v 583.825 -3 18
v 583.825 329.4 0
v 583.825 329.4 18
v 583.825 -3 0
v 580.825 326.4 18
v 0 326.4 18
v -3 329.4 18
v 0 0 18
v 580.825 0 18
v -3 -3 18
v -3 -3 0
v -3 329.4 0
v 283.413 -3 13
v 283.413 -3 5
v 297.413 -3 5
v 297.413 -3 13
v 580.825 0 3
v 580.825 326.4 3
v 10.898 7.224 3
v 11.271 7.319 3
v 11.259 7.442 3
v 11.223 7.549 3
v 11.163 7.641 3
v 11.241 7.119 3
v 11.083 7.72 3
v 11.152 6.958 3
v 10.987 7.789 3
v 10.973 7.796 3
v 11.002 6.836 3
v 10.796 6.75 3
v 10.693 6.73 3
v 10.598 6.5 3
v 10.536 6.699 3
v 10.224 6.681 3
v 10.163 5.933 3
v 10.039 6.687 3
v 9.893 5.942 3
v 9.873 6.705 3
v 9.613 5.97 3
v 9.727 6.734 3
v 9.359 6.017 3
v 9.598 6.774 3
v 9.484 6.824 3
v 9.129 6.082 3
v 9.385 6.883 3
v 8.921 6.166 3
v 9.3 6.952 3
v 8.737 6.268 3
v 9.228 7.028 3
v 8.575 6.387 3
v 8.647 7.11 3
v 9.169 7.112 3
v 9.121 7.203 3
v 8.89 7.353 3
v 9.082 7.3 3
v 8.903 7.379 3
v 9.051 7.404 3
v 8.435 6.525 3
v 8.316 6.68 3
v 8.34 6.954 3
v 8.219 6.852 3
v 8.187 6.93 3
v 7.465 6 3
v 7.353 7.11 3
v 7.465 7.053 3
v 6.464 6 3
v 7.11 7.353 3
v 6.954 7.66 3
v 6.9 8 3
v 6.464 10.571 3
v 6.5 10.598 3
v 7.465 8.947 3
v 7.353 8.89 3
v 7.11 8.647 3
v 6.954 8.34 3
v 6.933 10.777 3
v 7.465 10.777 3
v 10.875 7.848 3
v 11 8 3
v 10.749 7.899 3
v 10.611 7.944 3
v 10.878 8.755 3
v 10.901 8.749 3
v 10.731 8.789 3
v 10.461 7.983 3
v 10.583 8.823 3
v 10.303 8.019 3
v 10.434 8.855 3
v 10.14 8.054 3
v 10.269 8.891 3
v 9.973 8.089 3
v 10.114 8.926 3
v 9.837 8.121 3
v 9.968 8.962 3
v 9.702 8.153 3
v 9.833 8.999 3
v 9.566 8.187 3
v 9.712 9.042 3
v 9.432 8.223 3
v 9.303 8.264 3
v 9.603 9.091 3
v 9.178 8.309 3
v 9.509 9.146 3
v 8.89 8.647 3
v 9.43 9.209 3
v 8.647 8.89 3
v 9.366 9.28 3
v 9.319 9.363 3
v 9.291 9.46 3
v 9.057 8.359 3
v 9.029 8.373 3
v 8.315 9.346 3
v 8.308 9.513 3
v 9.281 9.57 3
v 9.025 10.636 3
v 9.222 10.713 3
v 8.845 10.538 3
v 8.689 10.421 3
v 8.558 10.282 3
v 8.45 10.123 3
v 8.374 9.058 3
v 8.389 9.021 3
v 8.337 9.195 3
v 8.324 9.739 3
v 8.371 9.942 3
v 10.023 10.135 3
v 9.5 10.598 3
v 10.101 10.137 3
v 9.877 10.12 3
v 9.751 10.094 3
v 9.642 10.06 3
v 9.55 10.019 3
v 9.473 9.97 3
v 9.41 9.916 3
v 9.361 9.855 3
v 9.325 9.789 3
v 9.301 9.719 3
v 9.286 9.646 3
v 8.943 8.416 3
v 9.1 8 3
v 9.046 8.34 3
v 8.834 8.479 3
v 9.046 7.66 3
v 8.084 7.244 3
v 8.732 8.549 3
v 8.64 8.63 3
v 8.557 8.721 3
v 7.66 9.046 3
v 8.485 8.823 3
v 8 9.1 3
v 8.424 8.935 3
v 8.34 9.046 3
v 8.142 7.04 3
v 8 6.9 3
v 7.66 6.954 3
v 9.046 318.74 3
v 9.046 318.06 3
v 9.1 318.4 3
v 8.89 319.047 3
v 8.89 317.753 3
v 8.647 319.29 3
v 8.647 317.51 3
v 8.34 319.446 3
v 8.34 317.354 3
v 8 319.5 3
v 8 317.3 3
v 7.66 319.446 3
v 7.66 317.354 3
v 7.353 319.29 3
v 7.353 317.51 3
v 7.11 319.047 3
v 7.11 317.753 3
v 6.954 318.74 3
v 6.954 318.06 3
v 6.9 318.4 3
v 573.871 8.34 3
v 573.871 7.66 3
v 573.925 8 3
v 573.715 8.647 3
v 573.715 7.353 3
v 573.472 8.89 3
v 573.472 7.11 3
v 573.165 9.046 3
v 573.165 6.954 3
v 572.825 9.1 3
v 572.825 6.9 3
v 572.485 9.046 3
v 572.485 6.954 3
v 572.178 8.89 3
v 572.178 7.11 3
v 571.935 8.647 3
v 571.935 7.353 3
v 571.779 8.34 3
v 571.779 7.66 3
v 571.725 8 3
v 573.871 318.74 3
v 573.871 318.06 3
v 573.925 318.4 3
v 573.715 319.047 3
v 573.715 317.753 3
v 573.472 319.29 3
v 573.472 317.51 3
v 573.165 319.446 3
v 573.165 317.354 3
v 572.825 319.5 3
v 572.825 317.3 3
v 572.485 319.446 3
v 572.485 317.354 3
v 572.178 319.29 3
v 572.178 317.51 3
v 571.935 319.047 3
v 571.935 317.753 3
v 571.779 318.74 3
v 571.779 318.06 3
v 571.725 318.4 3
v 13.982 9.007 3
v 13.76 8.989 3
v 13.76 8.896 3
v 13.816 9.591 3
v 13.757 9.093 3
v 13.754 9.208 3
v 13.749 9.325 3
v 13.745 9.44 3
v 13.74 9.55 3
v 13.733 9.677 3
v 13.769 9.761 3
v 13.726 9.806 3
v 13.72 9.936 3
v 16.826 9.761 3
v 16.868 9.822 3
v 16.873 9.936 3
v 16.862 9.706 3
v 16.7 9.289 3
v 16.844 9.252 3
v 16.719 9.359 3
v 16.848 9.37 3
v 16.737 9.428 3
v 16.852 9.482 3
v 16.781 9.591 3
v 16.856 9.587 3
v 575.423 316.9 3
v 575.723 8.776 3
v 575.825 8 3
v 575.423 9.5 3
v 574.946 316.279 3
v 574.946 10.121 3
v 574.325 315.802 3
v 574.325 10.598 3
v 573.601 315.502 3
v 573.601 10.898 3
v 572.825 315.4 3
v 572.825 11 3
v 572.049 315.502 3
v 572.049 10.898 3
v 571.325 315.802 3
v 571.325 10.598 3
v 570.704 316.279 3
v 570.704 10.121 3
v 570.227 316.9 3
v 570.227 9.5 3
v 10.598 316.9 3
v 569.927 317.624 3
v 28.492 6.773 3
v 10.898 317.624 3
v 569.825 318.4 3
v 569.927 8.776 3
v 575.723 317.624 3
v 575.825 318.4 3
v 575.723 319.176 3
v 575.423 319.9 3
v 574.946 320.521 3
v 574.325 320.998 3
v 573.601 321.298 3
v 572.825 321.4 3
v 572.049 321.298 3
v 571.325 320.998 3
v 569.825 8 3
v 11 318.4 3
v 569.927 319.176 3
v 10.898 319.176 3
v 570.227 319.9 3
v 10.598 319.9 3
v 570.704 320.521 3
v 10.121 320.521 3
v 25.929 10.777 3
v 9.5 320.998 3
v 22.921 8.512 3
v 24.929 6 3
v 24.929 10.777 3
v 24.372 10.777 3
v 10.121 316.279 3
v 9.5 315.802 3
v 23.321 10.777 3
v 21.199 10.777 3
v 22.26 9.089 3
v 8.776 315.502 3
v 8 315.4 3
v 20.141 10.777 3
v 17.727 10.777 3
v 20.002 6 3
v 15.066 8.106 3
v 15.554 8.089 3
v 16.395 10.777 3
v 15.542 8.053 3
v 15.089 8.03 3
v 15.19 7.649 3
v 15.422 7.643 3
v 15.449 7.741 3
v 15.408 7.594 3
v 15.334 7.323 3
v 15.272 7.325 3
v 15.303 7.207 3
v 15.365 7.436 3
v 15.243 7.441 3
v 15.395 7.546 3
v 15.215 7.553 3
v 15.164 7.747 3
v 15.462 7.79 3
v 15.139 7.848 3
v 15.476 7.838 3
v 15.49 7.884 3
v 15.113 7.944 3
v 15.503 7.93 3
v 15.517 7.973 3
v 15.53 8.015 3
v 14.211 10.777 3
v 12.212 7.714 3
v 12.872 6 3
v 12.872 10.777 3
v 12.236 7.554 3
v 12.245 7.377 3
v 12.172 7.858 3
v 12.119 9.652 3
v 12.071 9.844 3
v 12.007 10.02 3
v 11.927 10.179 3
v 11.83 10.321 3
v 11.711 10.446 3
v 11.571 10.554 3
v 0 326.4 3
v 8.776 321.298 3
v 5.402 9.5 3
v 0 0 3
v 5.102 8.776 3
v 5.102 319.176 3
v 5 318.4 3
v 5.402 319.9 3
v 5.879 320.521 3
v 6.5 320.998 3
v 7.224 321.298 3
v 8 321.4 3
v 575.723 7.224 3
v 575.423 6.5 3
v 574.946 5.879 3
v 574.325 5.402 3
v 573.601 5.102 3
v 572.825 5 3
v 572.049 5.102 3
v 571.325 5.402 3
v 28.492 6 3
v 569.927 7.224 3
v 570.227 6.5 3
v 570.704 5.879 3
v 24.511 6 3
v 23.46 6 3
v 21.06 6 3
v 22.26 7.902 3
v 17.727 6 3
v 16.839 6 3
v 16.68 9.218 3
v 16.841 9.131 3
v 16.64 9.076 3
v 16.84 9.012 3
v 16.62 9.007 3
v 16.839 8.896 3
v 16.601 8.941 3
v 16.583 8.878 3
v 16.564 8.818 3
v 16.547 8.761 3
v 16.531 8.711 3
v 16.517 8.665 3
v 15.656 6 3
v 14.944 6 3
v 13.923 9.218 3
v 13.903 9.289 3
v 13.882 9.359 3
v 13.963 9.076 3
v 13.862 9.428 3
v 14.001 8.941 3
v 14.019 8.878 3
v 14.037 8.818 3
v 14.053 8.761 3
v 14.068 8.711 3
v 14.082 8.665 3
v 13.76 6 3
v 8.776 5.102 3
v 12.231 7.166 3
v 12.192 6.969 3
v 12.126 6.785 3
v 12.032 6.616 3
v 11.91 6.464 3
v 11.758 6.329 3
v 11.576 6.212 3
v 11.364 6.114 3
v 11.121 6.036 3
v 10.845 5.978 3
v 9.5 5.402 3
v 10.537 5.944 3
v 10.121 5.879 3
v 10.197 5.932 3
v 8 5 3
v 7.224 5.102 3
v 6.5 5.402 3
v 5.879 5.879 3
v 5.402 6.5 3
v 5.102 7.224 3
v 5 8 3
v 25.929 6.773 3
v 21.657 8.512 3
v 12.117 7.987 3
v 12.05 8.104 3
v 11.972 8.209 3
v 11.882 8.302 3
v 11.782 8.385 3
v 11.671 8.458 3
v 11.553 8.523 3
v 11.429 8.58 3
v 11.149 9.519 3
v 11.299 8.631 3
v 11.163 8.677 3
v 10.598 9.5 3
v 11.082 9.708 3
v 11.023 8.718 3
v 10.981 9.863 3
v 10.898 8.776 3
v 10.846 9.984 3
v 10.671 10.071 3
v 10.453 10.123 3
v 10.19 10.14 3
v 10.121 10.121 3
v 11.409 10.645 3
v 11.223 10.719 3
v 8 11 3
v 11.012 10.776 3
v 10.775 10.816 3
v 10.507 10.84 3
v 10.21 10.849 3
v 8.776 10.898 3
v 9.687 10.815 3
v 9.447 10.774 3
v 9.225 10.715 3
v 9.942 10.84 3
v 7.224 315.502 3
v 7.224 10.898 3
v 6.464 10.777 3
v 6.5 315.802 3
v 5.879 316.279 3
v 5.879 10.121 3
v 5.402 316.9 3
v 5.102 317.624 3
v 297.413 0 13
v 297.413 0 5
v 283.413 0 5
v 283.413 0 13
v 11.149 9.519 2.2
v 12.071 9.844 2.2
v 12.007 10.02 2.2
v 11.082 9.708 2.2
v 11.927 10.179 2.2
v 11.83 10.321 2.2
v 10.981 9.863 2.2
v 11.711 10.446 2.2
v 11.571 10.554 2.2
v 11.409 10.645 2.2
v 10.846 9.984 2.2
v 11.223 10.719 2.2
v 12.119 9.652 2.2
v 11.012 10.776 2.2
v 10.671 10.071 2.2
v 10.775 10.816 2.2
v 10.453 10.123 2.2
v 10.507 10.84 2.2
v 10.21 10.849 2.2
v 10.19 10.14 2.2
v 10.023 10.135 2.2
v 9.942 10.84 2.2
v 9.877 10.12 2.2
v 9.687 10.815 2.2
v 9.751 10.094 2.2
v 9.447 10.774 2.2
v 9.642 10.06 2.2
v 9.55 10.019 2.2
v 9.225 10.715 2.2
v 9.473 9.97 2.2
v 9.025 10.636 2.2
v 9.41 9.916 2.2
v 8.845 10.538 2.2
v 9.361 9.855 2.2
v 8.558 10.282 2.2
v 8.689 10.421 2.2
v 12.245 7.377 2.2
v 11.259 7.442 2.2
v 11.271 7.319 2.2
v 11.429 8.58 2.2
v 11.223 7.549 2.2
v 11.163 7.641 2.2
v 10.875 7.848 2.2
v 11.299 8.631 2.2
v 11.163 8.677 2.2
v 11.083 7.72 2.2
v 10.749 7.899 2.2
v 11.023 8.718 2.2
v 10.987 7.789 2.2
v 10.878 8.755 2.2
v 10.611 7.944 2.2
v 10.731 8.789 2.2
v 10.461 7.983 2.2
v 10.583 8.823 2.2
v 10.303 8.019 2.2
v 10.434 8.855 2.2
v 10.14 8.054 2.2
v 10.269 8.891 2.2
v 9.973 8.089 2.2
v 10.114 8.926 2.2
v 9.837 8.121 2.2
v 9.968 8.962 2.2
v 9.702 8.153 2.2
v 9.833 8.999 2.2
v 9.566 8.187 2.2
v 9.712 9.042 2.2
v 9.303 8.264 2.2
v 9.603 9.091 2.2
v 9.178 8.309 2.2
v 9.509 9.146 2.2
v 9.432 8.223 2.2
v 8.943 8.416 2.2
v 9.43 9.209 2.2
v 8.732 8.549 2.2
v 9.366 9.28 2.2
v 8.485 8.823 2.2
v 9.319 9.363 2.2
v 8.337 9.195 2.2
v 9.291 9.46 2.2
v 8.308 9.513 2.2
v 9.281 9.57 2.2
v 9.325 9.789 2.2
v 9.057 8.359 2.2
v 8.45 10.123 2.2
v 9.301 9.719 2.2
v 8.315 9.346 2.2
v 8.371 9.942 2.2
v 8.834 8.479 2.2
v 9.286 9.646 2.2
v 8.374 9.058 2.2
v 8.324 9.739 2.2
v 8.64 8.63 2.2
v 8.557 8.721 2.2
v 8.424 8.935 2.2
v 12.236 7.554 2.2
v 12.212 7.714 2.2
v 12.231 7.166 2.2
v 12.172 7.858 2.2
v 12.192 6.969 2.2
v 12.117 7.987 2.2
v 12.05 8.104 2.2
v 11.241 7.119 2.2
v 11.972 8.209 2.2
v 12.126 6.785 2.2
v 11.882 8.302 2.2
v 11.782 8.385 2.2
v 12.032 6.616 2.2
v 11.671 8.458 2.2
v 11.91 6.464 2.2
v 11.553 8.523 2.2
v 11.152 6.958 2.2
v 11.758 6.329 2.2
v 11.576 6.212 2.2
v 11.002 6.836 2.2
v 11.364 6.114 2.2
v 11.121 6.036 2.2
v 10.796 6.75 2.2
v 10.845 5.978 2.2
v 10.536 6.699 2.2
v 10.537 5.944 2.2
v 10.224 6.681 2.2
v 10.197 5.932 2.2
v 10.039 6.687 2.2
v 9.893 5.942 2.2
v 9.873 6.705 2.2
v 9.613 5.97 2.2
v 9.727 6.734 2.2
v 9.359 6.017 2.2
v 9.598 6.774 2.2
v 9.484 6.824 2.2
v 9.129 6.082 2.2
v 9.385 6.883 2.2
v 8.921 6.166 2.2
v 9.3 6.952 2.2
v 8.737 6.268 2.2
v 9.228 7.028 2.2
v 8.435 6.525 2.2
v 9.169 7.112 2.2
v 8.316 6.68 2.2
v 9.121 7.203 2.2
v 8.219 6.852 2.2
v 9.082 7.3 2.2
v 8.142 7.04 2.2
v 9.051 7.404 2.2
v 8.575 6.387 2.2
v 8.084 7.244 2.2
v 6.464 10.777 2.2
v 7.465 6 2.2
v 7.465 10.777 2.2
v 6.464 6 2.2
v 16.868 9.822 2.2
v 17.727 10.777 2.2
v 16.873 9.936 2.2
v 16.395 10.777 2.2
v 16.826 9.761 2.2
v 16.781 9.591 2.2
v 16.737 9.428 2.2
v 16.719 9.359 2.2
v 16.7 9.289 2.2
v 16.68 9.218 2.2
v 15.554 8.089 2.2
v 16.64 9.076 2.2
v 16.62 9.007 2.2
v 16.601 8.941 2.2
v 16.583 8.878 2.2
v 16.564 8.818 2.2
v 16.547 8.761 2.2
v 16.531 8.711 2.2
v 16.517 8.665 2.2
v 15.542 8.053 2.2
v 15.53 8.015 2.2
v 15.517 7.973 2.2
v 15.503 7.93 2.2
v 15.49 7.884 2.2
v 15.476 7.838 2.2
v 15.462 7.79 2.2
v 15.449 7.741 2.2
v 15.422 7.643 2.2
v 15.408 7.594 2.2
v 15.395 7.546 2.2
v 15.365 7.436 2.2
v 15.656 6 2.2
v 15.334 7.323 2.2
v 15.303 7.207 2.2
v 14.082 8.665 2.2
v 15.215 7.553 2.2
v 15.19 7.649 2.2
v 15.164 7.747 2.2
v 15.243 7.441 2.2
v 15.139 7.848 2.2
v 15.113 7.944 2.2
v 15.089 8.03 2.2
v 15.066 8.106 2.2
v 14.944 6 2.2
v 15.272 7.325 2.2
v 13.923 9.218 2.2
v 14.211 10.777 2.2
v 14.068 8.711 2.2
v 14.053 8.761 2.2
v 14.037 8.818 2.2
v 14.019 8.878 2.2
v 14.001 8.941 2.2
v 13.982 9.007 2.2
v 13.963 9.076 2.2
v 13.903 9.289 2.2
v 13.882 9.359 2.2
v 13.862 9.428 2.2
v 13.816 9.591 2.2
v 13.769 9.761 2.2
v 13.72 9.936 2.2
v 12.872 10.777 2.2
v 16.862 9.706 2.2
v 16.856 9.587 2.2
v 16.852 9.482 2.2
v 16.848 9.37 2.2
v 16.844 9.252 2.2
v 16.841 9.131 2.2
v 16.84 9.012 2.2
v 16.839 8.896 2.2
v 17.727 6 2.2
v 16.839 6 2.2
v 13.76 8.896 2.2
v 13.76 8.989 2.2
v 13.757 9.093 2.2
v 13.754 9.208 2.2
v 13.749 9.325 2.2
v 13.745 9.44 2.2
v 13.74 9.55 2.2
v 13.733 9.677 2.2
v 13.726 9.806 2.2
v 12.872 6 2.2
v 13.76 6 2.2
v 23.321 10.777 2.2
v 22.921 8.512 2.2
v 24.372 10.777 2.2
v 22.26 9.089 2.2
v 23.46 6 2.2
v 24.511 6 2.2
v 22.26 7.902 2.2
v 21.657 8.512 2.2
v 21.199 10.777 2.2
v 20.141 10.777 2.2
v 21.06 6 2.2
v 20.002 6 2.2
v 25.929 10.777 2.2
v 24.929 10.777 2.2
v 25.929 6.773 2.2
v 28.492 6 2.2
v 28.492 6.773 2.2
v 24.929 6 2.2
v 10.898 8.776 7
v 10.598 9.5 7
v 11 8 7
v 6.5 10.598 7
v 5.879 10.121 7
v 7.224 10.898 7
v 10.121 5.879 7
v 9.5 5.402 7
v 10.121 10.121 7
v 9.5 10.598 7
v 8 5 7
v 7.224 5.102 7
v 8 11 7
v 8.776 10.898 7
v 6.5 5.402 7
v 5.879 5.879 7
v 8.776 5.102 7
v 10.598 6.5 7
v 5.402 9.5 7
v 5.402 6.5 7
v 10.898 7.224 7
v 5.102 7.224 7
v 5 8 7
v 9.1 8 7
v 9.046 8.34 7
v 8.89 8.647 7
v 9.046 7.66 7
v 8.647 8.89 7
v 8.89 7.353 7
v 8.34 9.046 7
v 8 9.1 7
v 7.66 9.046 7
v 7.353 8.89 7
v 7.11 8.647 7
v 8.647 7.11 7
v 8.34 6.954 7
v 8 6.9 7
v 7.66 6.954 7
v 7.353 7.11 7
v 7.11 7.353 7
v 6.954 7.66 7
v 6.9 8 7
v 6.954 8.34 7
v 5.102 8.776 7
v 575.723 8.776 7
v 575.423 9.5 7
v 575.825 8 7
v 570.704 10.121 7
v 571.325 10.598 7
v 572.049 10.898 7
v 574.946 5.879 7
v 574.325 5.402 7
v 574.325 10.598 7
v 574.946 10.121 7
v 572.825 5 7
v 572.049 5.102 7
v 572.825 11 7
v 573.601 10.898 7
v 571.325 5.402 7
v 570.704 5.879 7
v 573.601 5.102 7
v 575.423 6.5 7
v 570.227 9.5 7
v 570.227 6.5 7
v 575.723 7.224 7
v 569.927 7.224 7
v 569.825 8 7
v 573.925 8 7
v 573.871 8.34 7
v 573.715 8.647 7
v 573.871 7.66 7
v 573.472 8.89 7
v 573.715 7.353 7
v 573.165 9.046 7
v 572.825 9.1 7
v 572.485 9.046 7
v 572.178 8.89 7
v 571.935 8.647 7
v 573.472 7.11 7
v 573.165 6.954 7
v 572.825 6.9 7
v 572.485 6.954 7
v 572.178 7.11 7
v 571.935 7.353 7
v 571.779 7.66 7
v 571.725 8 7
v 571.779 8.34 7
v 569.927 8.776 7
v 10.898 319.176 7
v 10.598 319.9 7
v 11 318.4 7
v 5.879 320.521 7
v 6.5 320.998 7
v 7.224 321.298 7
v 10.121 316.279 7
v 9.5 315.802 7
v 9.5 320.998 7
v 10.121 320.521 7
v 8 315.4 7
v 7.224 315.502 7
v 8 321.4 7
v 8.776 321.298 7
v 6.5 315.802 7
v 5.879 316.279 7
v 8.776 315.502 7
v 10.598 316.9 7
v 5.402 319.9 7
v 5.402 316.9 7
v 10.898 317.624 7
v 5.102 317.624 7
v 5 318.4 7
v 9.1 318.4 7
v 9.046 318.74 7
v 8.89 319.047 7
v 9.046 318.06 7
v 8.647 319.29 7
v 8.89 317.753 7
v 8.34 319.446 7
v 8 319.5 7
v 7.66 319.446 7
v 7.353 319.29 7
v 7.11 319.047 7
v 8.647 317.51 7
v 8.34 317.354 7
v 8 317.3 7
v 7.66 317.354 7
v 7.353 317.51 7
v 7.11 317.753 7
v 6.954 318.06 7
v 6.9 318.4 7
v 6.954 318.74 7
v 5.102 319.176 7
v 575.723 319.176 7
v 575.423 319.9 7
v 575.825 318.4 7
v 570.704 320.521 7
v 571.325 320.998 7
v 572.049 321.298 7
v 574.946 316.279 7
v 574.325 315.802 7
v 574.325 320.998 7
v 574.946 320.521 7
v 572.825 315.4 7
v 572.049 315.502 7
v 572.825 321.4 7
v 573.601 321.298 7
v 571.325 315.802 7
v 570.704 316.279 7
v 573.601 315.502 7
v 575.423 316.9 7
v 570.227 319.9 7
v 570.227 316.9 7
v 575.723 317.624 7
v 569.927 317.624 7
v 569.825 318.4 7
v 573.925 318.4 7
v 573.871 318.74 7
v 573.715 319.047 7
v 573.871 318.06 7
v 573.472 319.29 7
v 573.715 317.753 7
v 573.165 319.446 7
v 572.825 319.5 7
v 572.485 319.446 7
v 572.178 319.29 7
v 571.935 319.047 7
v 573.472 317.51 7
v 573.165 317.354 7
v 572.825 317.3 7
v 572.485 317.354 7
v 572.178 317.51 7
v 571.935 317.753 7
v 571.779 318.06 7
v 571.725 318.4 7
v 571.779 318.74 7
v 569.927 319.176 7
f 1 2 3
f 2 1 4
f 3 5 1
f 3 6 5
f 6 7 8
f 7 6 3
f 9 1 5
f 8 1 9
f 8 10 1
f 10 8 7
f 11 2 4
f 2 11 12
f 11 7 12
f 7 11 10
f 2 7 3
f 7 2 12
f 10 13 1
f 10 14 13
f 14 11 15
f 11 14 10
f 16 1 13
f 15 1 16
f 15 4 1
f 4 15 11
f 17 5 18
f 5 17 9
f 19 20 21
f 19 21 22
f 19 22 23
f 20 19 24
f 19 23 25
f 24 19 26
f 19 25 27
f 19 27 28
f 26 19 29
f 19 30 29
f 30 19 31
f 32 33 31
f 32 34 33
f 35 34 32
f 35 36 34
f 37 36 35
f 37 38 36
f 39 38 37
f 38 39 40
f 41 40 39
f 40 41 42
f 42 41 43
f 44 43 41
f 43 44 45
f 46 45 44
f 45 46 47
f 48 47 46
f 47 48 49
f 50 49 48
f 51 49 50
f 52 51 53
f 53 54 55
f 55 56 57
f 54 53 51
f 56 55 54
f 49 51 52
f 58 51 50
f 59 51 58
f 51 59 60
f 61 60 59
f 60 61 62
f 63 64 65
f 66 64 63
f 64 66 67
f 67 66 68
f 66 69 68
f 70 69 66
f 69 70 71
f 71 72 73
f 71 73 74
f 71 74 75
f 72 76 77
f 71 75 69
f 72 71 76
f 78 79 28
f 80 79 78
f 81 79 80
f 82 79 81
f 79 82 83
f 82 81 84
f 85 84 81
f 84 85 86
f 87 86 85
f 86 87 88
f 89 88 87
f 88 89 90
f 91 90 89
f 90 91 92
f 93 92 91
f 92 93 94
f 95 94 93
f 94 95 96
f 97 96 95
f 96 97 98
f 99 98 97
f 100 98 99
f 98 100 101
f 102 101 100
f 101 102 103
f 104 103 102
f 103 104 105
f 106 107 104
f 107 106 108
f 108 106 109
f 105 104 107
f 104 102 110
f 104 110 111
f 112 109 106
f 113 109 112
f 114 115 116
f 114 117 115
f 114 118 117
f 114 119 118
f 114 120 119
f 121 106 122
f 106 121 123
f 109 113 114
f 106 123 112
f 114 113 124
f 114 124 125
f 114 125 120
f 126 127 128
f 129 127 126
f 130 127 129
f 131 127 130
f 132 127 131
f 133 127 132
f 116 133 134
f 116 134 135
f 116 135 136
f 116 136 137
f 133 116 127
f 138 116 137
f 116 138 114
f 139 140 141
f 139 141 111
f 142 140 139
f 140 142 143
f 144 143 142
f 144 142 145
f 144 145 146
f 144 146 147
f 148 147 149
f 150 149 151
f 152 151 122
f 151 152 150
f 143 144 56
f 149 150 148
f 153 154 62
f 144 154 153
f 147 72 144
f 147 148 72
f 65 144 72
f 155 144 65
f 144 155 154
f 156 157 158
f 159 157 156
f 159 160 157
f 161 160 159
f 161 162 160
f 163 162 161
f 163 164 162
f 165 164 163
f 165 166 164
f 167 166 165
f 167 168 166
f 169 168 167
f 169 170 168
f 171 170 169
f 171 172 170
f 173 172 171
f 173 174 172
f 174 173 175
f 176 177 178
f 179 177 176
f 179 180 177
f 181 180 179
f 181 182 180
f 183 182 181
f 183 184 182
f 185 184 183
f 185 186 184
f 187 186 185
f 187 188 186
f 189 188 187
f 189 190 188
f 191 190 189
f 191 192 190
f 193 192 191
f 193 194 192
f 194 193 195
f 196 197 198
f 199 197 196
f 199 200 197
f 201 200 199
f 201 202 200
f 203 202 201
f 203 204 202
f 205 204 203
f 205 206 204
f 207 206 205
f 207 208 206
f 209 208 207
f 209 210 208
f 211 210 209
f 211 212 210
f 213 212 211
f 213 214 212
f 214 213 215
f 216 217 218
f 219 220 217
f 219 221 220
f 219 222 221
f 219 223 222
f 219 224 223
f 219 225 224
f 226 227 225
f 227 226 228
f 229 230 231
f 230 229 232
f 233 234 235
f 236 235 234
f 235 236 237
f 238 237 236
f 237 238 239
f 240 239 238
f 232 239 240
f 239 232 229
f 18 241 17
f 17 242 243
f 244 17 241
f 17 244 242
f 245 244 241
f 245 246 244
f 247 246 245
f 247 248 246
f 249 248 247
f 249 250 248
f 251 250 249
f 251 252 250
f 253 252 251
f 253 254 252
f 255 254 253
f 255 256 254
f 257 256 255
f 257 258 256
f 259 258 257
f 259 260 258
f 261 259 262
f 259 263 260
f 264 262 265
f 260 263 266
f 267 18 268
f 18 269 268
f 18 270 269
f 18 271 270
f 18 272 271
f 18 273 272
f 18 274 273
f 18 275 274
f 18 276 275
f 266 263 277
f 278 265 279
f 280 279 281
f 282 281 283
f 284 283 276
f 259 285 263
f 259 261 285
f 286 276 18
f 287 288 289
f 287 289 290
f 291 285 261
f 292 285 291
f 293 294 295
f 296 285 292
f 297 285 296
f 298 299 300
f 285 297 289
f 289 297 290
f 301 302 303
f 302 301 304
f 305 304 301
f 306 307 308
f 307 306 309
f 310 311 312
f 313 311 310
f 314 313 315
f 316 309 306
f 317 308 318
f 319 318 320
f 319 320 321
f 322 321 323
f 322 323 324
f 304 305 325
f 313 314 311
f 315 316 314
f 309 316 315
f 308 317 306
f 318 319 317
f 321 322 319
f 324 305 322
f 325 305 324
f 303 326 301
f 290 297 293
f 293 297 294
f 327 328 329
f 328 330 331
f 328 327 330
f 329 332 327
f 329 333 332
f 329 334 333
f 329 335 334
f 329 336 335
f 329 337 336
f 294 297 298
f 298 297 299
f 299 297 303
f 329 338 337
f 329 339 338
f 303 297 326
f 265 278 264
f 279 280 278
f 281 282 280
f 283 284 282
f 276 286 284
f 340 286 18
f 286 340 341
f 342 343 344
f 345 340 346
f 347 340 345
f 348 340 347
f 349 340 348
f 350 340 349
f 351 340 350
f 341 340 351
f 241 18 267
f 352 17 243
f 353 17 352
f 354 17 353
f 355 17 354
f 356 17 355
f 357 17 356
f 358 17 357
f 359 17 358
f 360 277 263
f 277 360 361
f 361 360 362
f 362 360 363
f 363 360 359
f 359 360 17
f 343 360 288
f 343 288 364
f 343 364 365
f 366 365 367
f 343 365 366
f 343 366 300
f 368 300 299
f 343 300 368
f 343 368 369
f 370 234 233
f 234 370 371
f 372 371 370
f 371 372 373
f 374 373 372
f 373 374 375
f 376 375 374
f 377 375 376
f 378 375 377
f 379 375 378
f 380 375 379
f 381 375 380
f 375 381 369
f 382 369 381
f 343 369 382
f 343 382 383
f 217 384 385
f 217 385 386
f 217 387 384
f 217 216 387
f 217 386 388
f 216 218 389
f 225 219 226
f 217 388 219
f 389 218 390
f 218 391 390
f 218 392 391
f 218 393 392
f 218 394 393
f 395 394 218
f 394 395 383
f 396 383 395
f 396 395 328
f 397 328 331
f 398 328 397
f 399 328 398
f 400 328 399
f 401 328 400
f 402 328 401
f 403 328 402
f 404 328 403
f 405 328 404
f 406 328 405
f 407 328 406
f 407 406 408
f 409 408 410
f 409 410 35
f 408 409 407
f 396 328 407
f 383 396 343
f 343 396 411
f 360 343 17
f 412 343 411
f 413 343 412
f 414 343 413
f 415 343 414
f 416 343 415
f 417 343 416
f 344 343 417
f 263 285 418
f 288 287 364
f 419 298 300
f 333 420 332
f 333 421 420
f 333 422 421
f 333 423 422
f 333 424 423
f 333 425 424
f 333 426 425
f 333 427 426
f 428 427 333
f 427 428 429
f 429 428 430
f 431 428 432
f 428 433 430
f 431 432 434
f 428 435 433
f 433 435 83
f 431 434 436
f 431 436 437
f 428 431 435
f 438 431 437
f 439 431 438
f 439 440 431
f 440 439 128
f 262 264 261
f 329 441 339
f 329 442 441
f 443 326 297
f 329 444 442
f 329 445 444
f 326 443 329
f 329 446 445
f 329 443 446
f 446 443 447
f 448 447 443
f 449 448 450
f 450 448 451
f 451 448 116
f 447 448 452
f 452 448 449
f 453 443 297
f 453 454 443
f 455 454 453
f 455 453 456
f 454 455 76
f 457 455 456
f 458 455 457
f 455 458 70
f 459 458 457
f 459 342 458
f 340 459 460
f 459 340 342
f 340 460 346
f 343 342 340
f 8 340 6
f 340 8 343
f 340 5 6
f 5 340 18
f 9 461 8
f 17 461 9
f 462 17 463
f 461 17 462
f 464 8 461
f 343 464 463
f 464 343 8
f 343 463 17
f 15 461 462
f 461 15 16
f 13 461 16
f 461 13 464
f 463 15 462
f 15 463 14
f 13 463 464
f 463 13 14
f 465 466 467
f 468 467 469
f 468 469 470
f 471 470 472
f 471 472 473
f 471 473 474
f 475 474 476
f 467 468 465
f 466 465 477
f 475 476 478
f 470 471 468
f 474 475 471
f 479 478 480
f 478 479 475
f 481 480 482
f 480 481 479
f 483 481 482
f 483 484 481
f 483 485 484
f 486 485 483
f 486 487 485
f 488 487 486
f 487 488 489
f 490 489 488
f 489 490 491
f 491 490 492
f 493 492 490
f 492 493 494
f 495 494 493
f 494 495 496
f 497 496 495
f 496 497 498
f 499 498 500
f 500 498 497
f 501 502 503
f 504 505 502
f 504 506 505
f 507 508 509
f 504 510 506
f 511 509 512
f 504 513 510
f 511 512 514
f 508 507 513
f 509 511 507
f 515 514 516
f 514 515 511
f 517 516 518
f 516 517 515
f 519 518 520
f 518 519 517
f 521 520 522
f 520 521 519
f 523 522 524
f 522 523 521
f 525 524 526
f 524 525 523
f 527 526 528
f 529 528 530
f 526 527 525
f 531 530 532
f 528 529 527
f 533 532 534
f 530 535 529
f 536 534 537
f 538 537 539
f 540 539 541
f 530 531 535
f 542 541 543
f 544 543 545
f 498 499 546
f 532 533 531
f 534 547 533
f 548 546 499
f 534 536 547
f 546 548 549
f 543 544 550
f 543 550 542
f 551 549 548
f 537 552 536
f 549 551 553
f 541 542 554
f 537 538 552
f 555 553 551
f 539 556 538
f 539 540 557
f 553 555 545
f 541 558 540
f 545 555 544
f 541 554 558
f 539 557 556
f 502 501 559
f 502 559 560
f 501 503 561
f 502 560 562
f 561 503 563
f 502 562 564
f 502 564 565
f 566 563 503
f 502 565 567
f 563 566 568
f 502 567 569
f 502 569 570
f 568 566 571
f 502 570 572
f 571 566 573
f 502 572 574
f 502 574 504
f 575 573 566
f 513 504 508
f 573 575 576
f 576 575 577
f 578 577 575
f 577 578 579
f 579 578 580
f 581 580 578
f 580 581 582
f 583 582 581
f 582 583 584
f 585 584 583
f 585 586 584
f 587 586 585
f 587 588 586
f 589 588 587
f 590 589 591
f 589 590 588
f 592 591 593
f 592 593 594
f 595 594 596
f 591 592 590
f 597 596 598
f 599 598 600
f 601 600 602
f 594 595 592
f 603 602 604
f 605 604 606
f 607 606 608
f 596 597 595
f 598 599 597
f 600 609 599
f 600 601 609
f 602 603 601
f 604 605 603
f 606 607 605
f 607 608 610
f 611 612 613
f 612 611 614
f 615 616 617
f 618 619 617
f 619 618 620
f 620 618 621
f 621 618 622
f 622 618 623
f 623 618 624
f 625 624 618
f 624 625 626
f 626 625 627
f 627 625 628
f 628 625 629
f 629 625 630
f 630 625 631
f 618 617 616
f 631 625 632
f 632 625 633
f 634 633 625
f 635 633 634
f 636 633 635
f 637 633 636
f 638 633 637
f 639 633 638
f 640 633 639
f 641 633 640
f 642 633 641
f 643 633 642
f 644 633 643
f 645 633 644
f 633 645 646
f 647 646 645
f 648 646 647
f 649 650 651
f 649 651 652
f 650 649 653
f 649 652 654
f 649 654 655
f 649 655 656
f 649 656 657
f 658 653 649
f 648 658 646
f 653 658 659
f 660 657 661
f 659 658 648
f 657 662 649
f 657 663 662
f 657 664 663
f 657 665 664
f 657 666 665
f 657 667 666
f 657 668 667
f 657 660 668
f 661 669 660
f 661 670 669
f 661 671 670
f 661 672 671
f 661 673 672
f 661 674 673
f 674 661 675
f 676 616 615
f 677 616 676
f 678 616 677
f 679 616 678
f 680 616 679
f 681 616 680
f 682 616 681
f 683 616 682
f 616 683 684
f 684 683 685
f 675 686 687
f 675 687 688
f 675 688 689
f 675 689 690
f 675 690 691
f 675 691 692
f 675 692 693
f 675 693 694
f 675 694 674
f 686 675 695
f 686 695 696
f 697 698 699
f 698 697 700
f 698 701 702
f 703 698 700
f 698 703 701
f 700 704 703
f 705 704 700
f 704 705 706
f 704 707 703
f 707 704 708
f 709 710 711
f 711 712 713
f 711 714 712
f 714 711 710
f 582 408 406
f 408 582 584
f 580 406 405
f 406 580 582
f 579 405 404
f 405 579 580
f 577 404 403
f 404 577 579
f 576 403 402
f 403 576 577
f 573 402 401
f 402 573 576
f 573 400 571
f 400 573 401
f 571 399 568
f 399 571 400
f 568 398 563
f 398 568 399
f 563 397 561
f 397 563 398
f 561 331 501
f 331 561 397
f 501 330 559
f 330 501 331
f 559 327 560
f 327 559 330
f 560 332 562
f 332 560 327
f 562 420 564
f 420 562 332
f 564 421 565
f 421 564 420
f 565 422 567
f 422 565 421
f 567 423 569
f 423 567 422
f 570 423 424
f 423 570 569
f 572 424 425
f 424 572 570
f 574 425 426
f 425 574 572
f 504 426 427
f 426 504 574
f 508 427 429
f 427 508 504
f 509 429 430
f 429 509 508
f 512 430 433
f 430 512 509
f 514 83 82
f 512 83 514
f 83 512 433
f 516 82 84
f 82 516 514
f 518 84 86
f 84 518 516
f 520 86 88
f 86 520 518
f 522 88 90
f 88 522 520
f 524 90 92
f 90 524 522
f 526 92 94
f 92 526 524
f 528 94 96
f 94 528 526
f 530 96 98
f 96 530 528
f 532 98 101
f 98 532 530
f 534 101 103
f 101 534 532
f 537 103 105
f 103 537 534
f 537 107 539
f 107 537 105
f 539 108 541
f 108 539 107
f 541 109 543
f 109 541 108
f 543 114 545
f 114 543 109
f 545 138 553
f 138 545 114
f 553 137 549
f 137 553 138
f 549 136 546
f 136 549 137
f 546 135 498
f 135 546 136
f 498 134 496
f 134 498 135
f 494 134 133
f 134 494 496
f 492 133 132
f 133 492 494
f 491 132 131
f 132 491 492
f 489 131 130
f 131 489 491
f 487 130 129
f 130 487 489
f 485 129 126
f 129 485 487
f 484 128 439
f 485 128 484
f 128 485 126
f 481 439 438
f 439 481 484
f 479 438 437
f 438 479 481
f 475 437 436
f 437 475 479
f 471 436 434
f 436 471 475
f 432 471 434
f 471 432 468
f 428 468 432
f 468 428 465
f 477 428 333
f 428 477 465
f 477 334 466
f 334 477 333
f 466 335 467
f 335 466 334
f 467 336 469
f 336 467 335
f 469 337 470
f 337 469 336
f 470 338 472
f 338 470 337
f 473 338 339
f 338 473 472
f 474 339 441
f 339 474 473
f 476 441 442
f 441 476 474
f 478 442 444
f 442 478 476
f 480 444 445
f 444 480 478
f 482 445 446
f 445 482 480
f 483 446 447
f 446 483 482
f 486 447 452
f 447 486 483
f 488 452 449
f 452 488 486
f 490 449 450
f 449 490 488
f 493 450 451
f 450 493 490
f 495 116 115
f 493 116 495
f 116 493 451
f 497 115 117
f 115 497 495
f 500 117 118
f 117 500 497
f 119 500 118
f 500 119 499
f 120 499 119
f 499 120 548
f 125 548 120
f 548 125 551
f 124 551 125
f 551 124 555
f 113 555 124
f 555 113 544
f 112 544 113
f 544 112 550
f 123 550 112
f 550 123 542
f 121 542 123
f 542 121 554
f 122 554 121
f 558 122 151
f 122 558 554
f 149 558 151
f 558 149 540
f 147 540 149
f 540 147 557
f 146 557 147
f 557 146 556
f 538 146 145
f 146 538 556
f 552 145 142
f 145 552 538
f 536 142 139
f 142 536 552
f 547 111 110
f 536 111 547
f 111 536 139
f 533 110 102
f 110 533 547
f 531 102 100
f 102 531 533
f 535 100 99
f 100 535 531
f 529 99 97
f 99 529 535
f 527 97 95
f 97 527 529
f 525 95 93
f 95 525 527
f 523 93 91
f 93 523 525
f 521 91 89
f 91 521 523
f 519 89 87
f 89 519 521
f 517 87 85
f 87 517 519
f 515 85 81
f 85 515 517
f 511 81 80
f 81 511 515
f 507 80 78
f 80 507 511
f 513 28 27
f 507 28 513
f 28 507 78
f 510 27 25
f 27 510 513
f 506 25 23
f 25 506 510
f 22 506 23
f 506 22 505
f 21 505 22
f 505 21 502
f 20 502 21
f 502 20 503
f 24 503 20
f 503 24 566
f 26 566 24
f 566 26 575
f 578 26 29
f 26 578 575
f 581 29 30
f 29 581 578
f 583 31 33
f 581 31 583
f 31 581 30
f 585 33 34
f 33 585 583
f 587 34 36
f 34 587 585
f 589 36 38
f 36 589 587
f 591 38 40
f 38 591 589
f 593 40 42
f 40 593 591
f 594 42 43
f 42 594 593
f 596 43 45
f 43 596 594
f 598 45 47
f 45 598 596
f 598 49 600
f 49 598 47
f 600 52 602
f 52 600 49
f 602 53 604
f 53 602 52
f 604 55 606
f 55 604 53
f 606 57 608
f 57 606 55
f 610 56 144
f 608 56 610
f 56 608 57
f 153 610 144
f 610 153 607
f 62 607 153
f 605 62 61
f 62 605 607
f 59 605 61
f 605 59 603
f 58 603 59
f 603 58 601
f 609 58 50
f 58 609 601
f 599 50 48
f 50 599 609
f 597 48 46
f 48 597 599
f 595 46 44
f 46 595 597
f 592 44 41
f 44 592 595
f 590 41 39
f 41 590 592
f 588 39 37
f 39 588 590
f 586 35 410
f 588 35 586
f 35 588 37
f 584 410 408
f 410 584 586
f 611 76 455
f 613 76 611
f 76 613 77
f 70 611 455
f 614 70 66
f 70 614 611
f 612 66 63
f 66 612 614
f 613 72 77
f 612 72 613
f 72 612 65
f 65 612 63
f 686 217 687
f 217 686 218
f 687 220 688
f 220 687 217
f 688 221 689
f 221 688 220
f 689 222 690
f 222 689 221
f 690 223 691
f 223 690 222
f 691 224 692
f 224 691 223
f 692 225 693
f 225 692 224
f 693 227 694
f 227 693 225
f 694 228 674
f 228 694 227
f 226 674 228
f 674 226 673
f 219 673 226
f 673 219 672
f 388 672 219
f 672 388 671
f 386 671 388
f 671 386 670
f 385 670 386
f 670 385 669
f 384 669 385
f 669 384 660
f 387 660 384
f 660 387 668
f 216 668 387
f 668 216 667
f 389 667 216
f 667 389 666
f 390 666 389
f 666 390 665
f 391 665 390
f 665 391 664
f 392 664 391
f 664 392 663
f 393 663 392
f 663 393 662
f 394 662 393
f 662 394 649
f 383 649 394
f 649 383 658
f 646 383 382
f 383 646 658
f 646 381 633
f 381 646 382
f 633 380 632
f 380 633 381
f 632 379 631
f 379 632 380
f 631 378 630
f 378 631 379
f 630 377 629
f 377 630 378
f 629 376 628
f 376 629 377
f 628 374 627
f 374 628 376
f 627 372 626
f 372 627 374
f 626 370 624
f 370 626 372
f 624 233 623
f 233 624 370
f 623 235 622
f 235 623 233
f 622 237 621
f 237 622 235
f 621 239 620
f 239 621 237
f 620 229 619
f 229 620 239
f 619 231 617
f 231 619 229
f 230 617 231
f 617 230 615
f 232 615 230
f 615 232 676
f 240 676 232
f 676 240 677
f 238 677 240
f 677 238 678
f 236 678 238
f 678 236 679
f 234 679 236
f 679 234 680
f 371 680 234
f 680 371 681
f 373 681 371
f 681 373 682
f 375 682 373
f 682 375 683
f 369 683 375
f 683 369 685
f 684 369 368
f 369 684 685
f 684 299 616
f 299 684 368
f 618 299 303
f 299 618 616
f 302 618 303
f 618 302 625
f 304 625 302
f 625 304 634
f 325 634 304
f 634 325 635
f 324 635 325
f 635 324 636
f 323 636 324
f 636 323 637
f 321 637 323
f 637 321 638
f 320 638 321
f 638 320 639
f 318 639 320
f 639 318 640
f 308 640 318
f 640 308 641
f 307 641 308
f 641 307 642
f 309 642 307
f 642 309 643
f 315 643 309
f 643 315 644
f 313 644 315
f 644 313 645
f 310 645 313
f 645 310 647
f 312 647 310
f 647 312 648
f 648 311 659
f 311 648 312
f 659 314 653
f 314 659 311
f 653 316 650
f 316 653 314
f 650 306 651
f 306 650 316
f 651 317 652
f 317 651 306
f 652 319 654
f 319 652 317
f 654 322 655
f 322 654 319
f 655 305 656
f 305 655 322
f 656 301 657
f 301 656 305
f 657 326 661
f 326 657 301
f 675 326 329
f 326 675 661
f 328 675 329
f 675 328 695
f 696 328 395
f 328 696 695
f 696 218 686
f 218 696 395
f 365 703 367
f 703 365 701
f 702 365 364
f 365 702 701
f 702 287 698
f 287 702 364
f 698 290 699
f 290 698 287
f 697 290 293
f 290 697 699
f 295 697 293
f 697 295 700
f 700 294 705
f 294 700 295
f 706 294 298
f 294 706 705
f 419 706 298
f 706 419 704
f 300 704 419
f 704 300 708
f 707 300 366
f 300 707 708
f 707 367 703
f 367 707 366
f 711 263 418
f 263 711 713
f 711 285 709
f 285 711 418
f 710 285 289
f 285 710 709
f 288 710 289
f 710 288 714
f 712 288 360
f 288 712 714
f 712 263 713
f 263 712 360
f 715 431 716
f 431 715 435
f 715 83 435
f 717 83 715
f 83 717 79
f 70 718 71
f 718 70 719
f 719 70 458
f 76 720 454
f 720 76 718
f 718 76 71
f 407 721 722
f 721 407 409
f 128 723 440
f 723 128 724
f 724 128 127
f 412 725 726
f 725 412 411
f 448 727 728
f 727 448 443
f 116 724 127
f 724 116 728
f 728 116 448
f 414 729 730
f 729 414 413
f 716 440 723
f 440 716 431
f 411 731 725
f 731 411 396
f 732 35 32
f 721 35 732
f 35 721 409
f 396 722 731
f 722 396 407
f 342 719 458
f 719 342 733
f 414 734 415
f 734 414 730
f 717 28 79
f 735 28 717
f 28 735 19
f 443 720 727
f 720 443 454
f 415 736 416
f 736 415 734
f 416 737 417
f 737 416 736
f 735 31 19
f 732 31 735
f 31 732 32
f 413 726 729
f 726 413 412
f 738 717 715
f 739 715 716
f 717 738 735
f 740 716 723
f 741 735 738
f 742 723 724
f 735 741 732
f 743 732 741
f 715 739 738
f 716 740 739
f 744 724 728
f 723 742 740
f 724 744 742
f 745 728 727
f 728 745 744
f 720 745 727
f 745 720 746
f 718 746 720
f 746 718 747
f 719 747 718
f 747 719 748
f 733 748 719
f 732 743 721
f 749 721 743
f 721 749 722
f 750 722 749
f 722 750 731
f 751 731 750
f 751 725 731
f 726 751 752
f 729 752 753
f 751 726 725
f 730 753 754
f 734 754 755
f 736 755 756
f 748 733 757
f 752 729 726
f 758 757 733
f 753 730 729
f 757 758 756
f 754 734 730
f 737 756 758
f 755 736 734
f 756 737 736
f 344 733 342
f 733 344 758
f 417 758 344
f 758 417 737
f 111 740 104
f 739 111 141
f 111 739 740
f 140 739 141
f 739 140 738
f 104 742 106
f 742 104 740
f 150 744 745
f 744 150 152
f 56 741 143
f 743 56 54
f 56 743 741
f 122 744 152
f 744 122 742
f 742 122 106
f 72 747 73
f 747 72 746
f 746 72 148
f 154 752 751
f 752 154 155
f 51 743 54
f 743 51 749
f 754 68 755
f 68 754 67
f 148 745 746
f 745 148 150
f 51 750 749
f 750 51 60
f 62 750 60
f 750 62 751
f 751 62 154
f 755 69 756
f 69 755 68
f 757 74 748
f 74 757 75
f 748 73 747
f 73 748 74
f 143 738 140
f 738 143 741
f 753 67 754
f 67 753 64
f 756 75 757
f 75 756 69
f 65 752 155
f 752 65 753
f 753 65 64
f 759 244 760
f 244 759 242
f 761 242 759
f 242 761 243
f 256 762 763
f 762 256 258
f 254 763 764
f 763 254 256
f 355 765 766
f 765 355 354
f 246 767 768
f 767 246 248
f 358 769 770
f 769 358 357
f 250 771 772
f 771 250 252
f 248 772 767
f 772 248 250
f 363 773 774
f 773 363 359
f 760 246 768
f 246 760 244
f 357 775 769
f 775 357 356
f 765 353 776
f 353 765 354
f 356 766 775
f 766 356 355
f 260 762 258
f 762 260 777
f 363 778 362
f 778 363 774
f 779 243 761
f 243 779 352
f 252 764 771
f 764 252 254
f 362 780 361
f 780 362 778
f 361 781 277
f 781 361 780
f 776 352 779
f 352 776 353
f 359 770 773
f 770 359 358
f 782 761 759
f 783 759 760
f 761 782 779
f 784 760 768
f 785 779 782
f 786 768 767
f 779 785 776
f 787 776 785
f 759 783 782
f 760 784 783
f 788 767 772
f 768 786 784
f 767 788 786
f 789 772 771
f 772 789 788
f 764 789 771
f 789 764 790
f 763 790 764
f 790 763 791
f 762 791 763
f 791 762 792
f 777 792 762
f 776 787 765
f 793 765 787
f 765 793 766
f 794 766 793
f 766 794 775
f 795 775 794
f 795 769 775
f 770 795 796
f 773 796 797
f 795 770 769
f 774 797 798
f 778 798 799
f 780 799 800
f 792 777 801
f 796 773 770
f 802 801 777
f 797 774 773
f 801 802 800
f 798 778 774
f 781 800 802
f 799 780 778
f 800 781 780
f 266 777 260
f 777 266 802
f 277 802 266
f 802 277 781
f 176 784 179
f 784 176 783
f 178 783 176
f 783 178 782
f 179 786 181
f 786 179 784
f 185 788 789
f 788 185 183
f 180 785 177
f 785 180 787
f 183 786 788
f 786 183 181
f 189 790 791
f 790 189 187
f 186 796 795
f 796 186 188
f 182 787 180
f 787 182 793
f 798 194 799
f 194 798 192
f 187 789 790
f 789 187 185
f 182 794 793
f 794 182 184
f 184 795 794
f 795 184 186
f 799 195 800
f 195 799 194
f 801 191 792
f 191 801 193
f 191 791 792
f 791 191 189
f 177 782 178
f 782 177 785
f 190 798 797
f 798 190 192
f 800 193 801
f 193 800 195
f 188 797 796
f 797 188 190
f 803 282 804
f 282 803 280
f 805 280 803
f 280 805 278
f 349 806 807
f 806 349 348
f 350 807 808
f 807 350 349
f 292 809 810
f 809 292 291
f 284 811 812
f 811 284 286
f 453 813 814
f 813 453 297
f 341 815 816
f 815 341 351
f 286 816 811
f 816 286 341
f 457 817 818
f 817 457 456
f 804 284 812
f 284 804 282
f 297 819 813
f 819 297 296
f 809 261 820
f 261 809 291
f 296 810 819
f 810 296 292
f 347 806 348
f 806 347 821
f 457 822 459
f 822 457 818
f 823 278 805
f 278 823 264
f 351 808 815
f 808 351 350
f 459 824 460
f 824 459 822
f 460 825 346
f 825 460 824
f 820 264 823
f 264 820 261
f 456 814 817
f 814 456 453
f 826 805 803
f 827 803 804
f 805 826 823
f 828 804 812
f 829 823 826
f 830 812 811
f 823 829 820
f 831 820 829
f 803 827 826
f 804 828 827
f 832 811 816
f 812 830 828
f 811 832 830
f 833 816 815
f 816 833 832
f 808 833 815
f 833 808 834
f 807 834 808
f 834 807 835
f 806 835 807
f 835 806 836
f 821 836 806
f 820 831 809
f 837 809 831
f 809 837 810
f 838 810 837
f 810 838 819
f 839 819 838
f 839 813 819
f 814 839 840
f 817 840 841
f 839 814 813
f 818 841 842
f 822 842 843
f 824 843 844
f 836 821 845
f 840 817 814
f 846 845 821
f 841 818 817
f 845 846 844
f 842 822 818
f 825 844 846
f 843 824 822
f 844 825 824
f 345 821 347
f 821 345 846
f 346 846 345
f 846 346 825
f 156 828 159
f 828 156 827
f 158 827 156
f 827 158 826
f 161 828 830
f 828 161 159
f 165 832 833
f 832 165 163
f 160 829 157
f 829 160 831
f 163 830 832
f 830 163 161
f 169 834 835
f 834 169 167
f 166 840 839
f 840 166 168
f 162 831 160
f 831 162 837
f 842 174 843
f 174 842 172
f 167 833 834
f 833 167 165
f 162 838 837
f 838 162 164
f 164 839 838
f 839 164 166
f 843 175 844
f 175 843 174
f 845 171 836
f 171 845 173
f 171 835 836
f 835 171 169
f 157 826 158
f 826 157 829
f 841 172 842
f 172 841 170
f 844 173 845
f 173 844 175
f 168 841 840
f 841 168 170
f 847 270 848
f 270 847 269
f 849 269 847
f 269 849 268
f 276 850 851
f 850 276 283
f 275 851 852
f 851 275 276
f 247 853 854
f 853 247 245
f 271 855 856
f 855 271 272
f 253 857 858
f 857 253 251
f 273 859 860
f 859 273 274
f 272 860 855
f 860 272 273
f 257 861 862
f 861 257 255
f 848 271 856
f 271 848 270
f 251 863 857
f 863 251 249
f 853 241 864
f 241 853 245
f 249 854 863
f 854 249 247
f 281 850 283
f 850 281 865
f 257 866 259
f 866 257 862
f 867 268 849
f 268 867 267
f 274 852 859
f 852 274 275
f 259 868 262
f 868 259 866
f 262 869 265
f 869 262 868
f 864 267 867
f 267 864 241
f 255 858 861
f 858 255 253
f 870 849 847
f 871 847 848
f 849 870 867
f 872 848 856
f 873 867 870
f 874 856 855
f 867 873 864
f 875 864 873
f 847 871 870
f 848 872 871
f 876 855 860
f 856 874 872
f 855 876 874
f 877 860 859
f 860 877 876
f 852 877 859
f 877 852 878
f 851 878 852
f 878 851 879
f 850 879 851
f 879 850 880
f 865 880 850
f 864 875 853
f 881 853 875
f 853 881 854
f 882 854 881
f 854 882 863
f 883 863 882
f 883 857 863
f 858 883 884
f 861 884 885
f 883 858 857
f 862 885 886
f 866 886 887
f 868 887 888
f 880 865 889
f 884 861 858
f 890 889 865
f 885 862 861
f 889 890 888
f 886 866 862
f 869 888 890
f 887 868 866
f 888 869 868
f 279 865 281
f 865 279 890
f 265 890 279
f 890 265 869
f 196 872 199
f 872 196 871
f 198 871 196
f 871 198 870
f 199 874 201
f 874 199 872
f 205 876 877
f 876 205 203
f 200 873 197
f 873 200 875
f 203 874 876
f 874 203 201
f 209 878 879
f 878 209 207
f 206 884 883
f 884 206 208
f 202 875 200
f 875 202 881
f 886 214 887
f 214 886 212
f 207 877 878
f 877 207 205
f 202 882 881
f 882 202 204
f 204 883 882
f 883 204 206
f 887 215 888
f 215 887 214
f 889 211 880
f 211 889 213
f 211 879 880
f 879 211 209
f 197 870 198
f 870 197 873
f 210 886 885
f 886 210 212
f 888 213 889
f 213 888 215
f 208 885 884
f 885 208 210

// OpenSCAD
// ISM Extra-Large keyboard case
unit=19.05; rows=8; margin_x=18; margin_y=24; pcb_extra_x=40; pcb_units_x=26.5; pcb_extra_y=150;
wall=3; base_th=3; lip=1.2; usb_w=14; usb_h=8; mount_d=2.2; badge_depth=0.8;
pcb_w=margin_x*2+pcb_units_x*unit+pcb_extra_x; pcb_h=margin_y+rows*unit+pcb_extra_y;
case_w=pcb_w+2*wall; case_h=pcb_h+2*wall; case_z=18;
module switch_cutouts(){for(r=[0:6],c=[0:26])translate([margin_x+(c+0.5)*unit,margin_y+(r+0.5)*unit,-1])cube([14,14,wall+4],center=true);}
module bottom_shell(){difference(){translate([-wall,-wall,0])cube([case_w,case_h,case_z]);translate([0,0,base_th])cube([pcb_w,pcb_h,case_z]);translate([pcb_w/2-usb_w/2,-wall-1,base_th+2])cube([usb_w,wall+4,usb_h]);translate([6,6,base_th-badge_depth])linear_extrude(height=badge_depth+0.1)text("ISM XL",size=5,font="Liberation Sans:style=Bold");}for(p=[[8,8],[pcb_w-8,8],[8,pcb_h-8],[pcb_w-8,pcb_h-8]])translate([p[0],p[1],base_th])difference(){cylinder(h=4,d=6,$fn=24);translate([0,0,-0.1])cylinder(h=5,d=mount_d,$fn=20);}}
module top_plate(){difference(){translate([-lip,-lip,0])cube([pcb_w+2*lip,pcb_h+2*lip,wall]);switch_cutouts();translate([margin_x,margin_y+7*unit+2,-1])cube([pcb_units_x*unit,pcb_extra_y-4,wall+2]);}}
module top_frame(){difference(){translate([-wall,-wall,0])cube([case_w,case_h,8]);translate([lip,lip,-1])cube([pcb_w-2*lip,pcb_h-2*lip,10]);translate([pcb_w/2-usb_w/2,-wall-1,2])cube([usb_w,wall+4,usb_h]);}}
bottom_shell();
